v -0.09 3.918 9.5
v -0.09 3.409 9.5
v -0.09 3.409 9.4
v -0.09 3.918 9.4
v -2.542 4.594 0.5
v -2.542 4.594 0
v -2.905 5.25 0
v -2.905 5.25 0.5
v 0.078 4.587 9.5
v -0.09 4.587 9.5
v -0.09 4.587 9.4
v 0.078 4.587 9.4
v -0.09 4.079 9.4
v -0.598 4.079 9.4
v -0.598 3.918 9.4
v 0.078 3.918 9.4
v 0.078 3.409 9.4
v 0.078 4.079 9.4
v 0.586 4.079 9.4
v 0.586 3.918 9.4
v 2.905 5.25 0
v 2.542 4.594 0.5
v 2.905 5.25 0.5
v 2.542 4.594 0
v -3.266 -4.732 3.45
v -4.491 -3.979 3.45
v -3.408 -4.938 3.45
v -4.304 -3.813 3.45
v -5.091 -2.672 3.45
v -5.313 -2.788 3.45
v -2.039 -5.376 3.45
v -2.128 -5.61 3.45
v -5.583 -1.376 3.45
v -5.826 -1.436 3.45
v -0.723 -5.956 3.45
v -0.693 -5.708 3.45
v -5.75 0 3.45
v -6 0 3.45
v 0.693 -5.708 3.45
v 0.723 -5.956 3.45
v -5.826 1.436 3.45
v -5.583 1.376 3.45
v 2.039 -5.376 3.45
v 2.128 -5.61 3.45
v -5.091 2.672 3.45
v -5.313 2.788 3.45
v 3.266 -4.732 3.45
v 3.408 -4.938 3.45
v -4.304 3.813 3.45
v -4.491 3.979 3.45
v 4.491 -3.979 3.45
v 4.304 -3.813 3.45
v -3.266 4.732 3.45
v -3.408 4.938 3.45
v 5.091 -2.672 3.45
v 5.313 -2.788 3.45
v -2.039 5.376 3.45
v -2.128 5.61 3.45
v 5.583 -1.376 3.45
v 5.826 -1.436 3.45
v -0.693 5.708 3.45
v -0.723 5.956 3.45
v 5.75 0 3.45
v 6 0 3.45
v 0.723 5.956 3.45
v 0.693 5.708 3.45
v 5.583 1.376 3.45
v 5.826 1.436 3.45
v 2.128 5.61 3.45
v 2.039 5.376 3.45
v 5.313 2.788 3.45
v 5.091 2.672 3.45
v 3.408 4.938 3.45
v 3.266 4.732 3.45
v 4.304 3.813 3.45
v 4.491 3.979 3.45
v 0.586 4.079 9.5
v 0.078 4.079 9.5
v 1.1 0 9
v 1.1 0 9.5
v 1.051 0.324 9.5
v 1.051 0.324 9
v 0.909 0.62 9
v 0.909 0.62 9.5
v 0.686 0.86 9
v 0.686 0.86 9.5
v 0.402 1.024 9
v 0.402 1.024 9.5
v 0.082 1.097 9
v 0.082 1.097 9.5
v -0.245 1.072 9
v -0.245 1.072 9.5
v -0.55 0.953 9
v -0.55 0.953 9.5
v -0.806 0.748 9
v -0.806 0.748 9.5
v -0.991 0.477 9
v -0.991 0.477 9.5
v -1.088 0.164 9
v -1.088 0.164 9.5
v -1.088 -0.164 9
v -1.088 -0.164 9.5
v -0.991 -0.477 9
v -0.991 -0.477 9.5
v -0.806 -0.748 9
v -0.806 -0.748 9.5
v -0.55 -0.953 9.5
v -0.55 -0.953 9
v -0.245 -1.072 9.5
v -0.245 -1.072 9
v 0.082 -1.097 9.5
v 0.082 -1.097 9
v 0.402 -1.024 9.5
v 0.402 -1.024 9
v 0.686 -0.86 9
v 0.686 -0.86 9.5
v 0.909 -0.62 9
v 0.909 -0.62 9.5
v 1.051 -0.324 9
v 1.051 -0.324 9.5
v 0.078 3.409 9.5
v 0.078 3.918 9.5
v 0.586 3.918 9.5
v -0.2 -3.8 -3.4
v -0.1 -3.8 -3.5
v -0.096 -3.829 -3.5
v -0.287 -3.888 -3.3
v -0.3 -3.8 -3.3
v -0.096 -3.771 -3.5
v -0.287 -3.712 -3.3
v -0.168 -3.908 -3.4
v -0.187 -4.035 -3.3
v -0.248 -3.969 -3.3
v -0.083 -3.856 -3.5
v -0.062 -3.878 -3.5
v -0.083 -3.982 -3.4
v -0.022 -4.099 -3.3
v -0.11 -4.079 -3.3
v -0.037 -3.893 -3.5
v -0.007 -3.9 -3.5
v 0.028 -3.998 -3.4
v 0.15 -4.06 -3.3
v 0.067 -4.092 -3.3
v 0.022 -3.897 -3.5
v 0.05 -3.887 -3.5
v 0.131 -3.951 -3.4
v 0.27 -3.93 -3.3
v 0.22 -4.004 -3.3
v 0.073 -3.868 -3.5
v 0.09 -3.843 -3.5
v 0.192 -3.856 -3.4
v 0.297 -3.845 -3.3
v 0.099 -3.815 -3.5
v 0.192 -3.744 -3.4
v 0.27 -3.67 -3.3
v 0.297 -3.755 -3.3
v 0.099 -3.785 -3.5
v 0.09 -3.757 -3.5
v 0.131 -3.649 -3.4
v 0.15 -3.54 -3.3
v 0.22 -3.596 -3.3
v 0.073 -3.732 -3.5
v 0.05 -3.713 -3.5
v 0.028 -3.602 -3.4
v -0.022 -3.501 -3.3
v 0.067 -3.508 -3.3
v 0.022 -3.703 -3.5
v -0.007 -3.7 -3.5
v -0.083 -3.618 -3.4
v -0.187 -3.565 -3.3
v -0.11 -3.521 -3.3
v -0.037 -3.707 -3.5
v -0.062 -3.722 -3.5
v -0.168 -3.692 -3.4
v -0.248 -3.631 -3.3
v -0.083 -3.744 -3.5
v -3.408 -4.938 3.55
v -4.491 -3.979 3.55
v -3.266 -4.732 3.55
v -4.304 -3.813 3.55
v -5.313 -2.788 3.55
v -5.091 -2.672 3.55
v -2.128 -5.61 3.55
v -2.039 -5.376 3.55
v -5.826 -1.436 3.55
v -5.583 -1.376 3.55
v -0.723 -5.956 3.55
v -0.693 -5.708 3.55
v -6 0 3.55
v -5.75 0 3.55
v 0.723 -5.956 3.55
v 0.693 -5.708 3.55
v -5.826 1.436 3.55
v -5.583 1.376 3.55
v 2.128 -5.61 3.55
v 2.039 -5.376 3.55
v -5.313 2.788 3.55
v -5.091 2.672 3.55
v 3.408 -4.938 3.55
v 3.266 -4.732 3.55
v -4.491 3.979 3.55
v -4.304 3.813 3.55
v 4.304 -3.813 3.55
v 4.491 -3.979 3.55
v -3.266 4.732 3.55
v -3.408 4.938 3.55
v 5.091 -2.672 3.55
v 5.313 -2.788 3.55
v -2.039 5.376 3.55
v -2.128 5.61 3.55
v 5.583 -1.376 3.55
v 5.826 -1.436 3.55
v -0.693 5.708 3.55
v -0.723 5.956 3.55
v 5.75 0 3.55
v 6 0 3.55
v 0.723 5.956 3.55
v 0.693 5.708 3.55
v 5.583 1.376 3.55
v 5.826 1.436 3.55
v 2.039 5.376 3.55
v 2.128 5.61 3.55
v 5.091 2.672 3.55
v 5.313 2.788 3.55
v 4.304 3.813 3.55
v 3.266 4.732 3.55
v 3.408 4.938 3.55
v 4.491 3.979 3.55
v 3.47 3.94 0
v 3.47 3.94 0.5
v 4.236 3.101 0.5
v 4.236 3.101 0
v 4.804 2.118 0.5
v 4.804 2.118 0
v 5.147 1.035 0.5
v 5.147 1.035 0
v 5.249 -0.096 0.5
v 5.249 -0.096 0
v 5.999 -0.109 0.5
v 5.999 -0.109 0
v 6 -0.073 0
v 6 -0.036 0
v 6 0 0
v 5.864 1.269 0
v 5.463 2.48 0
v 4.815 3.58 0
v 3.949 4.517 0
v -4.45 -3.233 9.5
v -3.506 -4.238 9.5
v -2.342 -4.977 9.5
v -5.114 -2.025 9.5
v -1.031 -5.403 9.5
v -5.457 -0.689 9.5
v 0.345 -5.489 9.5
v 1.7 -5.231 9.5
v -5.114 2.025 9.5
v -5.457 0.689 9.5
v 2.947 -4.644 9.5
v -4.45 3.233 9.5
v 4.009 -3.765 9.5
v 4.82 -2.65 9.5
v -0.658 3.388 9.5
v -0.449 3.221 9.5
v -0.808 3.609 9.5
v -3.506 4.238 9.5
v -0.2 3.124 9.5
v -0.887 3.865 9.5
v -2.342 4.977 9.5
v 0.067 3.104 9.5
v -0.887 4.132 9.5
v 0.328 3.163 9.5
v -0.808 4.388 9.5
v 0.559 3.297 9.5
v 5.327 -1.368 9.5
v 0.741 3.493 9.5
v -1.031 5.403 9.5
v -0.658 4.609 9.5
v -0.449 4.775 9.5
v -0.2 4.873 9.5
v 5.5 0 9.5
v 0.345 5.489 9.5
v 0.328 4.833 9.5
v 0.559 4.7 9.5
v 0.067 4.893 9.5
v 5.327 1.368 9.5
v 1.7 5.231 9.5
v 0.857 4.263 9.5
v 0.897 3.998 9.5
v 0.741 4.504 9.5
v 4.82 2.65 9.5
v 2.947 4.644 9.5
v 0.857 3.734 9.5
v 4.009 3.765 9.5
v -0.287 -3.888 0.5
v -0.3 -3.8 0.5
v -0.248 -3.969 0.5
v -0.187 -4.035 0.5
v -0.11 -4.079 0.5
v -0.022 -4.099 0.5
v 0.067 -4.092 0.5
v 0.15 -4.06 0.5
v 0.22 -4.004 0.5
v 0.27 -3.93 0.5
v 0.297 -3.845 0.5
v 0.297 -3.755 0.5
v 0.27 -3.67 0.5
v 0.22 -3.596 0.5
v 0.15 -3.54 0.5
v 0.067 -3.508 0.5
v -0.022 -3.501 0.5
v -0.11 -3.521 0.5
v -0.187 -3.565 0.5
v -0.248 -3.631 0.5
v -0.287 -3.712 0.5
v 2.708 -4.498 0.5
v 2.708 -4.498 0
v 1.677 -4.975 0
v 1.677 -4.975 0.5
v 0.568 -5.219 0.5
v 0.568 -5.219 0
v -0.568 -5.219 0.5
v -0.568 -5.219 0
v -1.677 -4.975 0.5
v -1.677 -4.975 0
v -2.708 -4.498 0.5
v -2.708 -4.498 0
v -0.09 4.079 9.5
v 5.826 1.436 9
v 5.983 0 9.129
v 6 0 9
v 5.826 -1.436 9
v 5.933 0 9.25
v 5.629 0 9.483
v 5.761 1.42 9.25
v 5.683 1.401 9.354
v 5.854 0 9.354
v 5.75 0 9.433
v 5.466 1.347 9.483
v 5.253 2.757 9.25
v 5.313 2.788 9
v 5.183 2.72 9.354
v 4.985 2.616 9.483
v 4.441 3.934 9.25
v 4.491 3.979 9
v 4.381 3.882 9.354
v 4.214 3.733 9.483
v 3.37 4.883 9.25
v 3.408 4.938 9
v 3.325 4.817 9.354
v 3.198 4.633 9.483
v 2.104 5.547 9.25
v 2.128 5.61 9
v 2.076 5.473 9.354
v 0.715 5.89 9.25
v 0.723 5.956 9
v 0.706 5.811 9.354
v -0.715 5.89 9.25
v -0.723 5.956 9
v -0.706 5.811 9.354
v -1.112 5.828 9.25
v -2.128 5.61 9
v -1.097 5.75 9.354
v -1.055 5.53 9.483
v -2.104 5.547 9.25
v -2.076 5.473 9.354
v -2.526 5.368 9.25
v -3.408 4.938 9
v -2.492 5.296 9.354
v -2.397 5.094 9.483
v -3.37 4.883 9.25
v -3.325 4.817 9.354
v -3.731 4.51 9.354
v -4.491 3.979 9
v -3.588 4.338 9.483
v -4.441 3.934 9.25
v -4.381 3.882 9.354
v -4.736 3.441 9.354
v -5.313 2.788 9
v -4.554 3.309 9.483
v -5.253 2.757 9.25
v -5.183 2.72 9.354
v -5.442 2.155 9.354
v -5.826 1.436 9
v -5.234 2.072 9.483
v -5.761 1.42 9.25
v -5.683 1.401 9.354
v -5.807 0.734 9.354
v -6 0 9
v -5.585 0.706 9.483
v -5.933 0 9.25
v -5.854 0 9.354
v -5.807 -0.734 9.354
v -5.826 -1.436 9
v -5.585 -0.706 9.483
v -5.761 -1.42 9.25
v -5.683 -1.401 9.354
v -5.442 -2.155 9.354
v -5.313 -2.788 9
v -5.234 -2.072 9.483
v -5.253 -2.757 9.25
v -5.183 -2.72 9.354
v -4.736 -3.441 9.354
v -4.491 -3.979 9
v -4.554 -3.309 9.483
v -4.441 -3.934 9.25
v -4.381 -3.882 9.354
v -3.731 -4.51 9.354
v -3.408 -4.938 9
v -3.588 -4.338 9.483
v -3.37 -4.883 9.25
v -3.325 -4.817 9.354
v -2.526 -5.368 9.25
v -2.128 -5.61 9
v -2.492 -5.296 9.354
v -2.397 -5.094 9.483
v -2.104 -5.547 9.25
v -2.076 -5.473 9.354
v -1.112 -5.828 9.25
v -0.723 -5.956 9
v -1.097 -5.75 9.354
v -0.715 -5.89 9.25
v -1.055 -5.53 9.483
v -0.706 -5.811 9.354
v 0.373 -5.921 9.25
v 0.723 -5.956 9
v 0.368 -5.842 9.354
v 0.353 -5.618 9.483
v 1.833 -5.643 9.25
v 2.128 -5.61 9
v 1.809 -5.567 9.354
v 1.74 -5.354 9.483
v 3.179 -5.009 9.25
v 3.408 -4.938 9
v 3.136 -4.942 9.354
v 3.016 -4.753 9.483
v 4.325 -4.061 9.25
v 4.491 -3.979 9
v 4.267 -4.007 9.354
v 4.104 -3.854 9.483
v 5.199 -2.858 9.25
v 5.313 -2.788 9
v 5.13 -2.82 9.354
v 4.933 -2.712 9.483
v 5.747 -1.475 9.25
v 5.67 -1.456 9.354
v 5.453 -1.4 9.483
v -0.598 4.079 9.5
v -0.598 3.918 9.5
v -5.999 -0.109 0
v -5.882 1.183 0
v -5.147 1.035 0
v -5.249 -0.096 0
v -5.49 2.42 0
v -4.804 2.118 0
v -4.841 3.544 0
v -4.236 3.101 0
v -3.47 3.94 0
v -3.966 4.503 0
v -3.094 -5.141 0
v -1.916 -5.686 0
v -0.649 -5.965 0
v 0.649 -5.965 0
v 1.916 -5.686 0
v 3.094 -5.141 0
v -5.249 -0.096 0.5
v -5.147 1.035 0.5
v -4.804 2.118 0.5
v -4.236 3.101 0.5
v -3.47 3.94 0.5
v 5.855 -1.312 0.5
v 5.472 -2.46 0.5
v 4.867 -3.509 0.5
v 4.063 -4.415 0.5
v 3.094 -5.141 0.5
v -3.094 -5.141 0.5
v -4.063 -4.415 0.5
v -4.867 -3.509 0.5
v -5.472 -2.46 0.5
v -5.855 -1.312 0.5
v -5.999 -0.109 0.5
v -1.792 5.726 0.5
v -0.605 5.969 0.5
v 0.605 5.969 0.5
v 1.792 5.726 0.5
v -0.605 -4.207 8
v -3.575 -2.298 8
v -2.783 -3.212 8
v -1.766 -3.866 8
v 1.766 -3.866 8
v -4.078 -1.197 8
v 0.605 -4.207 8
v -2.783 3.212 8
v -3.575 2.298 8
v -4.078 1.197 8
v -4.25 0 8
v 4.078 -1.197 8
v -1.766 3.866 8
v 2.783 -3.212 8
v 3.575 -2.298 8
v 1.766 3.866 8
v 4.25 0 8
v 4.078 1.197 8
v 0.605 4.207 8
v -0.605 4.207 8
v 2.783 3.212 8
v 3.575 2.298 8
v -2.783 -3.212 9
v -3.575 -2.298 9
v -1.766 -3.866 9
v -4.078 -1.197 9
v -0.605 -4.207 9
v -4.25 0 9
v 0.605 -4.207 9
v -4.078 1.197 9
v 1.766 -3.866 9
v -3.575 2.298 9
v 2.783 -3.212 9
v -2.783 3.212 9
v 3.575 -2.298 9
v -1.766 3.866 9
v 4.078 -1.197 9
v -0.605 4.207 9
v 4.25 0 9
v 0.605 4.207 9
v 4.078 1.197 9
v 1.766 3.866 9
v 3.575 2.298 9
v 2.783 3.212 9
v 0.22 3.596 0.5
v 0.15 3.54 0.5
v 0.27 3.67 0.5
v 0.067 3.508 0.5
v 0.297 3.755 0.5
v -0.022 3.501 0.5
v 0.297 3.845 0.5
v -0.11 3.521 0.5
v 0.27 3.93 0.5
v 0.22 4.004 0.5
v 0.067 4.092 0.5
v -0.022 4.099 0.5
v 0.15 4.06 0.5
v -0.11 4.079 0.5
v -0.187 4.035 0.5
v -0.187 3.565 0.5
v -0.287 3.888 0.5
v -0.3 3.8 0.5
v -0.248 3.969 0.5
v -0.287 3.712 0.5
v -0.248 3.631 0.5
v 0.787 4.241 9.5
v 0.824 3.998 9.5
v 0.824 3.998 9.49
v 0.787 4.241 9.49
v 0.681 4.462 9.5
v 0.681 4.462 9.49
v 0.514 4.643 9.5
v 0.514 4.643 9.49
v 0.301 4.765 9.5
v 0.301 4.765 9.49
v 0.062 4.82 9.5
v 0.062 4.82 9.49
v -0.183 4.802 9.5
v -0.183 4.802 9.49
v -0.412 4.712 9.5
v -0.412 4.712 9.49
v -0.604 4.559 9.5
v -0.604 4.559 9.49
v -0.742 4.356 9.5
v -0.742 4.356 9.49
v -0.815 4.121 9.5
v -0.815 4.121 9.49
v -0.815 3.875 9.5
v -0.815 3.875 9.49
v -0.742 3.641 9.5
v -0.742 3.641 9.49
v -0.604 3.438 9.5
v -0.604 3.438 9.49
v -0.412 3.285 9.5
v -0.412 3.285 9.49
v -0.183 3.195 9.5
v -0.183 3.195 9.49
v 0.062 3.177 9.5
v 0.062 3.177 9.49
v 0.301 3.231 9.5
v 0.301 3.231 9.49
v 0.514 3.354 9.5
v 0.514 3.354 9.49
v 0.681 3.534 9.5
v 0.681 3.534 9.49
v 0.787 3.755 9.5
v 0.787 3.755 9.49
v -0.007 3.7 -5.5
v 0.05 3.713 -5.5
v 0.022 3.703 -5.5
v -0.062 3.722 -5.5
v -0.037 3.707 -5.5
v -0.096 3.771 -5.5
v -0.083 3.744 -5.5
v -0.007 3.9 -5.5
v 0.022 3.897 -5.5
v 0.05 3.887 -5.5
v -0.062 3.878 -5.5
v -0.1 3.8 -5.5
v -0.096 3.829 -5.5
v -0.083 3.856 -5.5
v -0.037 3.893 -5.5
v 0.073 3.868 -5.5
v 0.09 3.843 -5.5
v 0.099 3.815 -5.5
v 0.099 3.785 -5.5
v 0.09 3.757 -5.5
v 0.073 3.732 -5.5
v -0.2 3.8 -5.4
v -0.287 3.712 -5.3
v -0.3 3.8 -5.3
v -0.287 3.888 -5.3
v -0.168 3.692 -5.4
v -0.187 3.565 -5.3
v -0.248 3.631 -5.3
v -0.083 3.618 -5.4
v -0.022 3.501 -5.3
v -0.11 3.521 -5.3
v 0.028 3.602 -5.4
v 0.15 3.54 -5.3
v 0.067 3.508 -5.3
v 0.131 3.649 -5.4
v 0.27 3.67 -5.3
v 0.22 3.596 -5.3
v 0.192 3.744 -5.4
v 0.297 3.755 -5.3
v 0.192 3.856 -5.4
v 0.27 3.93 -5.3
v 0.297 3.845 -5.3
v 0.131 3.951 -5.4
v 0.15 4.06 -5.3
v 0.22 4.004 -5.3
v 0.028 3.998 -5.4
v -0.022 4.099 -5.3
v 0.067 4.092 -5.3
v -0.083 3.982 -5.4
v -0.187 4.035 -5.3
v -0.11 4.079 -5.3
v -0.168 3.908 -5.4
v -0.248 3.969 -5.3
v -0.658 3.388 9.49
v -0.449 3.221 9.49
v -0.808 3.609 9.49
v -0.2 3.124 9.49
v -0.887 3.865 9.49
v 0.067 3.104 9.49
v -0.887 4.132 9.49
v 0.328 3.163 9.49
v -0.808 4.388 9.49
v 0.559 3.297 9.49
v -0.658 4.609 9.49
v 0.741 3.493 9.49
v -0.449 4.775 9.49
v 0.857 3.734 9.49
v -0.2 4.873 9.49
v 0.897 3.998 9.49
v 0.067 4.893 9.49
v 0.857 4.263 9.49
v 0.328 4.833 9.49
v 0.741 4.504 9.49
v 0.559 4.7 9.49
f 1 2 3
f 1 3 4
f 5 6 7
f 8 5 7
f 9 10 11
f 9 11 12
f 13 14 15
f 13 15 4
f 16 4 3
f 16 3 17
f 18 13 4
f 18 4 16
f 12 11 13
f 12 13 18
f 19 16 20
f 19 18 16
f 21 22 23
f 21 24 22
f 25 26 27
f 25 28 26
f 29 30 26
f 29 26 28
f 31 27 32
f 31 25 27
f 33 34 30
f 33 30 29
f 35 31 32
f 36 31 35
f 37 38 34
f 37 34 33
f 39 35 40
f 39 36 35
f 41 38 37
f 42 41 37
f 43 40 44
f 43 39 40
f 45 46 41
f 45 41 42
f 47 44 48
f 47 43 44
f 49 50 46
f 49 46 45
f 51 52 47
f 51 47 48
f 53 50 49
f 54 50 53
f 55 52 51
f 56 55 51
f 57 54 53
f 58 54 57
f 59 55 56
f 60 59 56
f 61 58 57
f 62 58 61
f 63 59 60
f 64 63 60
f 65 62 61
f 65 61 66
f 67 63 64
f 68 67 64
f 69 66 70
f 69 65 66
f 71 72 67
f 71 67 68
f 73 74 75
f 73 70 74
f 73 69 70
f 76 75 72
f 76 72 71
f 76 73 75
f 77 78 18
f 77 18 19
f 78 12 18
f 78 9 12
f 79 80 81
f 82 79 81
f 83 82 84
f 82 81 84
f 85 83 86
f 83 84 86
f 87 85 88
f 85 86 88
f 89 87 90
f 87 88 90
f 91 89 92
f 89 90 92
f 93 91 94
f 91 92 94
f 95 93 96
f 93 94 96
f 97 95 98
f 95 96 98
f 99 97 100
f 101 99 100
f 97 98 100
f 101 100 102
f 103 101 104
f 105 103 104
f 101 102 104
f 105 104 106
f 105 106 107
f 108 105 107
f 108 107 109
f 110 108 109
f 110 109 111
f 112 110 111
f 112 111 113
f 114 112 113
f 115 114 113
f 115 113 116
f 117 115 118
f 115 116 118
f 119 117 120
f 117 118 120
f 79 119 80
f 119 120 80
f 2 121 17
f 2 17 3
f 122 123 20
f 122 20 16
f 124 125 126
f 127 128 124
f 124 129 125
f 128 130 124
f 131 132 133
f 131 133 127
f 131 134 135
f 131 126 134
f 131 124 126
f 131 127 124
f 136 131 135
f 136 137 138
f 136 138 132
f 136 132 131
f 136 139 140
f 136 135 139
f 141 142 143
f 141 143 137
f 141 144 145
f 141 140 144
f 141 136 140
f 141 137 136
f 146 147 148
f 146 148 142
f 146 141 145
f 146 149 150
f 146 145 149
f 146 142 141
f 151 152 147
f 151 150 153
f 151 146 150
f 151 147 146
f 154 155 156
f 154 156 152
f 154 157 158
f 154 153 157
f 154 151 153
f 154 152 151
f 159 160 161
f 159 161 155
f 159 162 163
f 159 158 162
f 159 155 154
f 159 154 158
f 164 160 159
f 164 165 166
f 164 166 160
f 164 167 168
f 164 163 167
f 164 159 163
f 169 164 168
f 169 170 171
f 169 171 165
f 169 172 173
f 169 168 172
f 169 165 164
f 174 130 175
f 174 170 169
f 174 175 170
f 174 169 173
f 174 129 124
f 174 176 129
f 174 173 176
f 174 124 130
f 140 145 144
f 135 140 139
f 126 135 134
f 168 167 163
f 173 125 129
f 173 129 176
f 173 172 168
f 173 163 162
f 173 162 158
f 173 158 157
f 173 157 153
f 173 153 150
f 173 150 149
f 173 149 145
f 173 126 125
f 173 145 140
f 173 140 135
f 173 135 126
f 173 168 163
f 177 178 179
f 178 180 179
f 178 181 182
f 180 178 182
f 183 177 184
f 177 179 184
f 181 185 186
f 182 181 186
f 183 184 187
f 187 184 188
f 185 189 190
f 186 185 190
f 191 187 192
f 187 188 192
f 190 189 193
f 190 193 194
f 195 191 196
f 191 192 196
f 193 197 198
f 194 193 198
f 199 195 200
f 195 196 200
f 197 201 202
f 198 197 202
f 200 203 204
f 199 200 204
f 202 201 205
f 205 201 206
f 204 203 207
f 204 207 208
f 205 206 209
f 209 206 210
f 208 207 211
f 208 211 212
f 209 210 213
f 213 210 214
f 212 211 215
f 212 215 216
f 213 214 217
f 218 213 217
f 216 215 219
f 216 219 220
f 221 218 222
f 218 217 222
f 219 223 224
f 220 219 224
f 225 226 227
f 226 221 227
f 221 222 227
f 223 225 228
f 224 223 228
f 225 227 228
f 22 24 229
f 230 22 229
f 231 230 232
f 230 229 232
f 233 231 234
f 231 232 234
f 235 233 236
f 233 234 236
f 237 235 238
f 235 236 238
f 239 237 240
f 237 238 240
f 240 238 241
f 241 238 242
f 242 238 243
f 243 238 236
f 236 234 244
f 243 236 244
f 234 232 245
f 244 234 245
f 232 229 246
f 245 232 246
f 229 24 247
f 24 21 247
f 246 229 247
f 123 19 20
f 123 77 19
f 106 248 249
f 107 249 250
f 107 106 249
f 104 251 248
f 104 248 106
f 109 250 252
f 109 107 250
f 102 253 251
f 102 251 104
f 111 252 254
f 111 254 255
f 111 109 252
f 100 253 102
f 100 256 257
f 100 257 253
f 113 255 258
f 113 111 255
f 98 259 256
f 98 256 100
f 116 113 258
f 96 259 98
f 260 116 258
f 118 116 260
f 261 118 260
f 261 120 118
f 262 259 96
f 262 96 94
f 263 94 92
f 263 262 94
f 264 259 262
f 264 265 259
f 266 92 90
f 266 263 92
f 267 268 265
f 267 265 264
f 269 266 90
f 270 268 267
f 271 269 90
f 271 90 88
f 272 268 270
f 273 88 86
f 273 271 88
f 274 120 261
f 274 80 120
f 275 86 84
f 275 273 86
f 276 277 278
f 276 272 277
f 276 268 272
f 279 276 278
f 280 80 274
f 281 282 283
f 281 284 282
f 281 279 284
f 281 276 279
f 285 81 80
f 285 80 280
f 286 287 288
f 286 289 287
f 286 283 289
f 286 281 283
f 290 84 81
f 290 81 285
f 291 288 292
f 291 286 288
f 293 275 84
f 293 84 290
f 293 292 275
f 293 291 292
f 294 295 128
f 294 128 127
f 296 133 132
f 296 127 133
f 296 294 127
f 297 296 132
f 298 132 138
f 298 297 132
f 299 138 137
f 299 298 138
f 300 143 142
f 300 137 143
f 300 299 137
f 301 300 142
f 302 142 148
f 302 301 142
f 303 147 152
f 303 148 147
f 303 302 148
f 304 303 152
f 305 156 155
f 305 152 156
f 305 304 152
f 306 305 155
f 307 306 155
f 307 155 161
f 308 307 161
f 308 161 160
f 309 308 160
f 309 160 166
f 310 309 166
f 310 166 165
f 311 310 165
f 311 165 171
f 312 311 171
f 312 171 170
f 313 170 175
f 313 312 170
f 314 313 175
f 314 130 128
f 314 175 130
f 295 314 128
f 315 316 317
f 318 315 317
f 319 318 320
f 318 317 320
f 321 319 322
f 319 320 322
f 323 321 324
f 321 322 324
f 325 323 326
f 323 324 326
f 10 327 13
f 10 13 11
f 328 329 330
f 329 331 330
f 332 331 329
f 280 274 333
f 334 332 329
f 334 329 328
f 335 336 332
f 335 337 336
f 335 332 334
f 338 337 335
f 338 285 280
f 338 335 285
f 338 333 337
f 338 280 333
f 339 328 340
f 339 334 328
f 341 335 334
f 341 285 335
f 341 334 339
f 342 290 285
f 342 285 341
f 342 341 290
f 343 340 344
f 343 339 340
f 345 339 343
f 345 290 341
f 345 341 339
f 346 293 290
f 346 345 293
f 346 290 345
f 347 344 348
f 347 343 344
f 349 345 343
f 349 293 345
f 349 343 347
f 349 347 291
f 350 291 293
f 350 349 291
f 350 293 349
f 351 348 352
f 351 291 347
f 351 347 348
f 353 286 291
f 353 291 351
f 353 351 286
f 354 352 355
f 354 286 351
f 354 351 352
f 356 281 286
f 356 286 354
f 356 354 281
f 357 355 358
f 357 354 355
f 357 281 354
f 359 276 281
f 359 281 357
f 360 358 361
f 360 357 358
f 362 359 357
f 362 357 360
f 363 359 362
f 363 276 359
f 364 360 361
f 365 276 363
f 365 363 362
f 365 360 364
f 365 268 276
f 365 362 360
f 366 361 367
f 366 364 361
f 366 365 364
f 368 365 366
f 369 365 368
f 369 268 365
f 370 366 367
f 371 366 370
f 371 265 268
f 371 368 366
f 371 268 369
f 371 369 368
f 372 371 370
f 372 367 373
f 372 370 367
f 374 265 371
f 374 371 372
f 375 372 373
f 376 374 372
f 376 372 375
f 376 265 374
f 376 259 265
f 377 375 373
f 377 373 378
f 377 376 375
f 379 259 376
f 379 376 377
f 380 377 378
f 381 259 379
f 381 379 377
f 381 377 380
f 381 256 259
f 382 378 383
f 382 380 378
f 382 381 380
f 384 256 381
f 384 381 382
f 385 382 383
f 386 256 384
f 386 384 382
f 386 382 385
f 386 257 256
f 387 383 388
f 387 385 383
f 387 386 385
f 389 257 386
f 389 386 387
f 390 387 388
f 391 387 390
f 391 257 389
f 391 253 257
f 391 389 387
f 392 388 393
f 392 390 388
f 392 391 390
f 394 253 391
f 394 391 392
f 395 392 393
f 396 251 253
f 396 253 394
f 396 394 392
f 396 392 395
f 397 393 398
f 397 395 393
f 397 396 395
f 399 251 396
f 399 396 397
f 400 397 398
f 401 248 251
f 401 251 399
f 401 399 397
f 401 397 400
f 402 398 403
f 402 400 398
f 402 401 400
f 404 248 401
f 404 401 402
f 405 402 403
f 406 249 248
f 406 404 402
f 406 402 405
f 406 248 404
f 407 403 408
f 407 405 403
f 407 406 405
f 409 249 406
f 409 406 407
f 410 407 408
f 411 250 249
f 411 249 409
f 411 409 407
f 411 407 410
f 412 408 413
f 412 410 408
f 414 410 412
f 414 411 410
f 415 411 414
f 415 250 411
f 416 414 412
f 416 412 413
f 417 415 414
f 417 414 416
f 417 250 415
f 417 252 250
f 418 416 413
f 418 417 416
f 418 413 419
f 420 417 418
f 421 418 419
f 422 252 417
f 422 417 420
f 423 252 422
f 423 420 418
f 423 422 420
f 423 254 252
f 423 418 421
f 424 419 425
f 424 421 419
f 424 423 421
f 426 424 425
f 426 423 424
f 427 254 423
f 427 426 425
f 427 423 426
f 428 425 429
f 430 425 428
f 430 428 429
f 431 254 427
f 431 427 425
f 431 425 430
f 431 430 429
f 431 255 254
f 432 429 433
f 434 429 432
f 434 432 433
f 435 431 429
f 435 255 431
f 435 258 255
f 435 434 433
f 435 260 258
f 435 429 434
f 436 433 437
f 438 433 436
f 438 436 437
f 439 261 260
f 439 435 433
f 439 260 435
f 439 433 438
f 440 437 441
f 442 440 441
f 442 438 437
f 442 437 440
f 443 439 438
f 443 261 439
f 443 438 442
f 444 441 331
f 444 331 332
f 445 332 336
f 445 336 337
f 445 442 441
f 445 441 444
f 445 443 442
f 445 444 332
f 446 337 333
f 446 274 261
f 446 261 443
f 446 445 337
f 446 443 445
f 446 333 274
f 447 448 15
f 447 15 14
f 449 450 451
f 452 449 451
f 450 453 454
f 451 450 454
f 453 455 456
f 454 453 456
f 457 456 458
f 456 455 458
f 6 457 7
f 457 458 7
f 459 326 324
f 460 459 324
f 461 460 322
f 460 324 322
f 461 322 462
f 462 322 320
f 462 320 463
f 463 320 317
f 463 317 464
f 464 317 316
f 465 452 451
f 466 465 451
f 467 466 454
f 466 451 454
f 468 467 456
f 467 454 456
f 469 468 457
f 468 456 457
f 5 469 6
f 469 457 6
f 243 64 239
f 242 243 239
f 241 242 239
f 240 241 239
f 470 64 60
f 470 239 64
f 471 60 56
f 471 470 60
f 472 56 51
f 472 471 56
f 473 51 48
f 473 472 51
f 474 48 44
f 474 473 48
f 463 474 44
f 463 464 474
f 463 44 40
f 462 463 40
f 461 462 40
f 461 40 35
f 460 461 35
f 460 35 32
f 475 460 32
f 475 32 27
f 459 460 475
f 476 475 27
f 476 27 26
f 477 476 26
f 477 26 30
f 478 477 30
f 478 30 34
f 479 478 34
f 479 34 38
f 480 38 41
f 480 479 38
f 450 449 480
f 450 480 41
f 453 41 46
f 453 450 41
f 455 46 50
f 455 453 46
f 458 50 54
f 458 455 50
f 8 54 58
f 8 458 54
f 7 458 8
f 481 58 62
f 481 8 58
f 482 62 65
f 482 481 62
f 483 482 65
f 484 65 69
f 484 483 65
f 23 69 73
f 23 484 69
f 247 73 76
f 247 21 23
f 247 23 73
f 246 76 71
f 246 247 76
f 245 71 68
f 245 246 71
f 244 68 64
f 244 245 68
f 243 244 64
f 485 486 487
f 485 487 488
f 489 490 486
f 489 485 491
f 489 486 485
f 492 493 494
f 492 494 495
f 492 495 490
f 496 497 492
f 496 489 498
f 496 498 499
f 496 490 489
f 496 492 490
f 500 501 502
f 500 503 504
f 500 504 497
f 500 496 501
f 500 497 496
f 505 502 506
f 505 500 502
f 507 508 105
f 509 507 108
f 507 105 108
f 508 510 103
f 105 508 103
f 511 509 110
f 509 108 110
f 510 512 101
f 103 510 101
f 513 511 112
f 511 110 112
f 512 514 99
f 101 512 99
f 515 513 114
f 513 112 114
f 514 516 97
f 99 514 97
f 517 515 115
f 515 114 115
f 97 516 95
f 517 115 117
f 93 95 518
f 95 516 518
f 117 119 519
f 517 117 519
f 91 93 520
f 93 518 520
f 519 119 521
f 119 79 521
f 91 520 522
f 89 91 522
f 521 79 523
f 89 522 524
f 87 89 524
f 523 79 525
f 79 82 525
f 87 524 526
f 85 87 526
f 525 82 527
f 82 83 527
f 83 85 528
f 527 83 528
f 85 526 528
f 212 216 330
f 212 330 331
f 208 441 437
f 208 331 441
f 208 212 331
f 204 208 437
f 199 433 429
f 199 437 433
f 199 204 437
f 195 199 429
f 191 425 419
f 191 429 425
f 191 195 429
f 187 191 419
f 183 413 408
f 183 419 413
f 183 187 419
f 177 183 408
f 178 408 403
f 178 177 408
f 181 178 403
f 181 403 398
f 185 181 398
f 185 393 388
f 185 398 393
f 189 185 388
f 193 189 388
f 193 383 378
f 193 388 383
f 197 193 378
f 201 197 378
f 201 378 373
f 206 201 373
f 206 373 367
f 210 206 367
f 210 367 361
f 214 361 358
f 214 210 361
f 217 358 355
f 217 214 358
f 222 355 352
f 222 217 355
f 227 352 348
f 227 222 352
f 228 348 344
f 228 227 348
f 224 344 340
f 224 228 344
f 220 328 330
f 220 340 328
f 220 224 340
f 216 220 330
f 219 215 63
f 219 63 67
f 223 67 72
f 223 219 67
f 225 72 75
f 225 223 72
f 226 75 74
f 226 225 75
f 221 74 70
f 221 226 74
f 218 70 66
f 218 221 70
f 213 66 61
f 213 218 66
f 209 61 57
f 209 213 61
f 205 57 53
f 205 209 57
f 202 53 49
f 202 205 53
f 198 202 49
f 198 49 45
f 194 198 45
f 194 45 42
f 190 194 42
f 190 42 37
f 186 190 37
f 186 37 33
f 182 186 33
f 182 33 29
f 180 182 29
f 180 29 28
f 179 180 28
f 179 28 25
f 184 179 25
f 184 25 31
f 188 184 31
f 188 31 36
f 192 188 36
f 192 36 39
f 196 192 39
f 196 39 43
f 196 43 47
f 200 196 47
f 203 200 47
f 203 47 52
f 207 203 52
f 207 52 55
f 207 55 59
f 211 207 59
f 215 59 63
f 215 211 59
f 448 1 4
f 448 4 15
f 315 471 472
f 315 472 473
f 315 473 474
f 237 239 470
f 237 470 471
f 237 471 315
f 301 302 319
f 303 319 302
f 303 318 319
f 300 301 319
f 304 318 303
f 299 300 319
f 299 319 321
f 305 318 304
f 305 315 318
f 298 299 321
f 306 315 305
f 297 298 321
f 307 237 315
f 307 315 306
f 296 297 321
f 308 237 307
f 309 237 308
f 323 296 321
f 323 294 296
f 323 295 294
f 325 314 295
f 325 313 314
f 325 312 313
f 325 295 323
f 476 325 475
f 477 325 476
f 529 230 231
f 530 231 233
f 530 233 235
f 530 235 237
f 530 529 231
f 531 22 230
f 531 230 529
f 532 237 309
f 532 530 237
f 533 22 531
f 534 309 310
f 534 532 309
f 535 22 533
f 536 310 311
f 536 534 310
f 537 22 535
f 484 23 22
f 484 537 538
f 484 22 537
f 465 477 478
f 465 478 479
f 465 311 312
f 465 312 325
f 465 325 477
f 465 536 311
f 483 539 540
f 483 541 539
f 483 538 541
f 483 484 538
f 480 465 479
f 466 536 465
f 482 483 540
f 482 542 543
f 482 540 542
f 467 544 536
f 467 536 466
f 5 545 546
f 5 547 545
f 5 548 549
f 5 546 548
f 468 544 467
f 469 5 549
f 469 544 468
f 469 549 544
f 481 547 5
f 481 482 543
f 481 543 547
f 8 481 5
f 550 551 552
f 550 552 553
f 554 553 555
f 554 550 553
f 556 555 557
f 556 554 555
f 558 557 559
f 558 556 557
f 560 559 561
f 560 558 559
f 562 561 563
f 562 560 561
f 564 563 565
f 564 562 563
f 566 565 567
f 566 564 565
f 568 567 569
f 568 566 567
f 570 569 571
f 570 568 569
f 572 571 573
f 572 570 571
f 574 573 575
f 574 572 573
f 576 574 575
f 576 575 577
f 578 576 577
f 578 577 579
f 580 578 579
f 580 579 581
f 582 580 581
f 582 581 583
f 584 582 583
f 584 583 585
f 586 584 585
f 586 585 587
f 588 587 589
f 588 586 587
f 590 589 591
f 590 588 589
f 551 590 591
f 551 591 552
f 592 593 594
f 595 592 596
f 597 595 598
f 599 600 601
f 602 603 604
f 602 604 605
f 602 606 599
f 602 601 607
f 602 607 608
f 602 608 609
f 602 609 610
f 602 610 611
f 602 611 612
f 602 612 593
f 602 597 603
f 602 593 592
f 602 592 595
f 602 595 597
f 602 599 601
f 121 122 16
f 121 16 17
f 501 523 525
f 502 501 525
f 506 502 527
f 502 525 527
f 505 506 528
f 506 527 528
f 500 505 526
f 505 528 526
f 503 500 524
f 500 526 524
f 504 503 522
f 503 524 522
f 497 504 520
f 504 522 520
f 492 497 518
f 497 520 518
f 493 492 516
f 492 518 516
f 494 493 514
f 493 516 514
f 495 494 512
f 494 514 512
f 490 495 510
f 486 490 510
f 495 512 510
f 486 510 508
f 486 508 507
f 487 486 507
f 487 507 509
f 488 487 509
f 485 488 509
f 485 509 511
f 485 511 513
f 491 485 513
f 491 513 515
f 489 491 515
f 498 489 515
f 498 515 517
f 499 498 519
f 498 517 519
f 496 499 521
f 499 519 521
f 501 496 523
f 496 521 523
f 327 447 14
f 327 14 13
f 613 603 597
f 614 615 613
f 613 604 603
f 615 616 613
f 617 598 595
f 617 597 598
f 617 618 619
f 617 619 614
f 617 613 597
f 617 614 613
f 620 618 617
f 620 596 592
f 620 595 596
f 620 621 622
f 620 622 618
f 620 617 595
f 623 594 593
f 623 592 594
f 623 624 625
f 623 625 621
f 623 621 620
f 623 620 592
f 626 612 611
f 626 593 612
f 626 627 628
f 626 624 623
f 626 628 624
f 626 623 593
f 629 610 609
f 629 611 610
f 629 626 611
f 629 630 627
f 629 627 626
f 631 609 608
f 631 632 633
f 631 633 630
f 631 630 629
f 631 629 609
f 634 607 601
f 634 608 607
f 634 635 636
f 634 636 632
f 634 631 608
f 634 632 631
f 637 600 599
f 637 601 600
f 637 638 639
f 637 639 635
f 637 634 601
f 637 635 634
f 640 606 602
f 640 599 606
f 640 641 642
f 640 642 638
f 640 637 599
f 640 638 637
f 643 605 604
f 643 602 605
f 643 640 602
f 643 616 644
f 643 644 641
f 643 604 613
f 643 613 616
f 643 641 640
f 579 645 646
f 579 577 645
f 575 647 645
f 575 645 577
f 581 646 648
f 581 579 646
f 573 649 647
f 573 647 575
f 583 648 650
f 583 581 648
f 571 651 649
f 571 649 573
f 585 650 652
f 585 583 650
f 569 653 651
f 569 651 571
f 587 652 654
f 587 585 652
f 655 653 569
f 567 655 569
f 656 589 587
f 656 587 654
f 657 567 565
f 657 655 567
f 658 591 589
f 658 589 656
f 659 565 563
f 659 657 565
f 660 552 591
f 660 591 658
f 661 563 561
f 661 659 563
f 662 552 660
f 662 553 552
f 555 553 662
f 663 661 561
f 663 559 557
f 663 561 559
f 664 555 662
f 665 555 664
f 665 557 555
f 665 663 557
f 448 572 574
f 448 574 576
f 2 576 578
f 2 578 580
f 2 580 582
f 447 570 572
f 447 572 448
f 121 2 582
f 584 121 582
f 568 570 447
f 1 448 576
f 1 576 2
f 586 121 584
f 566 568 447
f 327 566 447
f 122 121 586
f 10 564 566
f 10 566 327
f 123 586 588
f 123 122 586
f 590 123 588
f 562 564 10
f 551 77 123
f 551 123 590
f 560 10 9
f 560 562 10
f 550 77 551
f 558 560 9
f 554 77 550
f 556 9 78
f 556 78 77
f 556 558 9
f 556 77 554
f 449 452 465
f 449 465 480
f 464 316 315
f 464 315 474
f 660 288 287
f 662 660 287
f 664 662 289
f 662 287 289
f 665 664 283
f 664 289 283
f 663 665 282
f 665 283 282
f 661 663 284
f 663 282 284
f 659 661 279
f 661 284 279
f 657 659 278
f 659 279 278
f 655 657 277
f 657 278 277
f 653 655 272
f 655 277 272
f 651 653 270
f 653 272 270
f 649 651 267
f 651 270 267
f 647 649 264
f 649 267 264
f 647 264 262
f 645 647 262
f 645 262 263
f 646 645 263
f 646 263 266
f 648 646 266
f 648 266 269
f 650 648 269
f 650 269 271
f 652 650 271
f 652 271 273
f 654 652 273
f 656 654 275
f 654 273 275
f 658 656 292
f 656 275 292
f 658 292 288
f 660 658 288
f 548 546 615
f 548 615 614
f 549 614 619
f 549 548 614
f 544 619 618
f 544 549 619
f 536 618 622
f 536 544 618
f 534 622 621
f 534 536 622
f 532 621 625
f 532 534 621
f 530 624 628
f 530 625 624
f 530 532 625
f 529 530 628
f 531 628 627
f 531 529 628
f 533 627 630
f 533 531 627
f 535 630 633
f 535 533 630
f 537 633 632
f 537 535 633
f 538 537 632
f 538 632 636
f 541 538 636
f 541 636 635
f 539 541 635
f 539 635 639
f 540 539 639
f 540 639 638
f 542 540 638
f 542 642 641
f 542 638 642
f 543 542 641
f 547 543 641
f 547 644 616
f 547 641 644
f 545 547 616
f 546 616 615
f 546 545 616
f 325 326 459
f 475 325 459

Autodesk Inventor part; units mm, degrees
ref_plane "YZ Plane" through (0, 0, 0) normal (1, 0, 0) x (0, 1, 0)
ref_plane "XZ Plane" through (0, 0, 0) normal (0, 1, 0) x (-1, 0, 0)
ref_plane "XY Plane" through (0, 0, 0) normal (0, 0, 1) x (1, 0, 0)
sketch "Sketch1" plane through (0, 0, 0) normal (0, 0, 1) x (1, 0, 0)
  circle A0 centre (0, 0) radius 6
  dimension "d0" = 12
extrude "Extrusion1" add sketch "Sketch1" along normal blind 9.5
ref_plane "Work Plane1" through (0, 0, 9) normal (0, 0, 1) x (1, 0, 0)
sketch "Sketch2" plane through (0, 0, 9) normal (0, 0, 1) x (1, 0, 0)
  circle A0 centre (0, 0) radius 6 projected
  circle A1 centre (0, 0) radius 4.25
  dimension "d4" = 8.5
extrude "Extrusion2" cut sketch "Sketch2" against normal blind 1 contours A1
sketch "Sketch3" plane through (0, 0, 9.5) normal (0, 0, 1) x (1, 0, 0)
  circle A0 centre (0, 0) radius 6 projected
  circle A1 centre (0, 0) radius 1.1
  dimension "d7" = 2.2
extrude "Extrusion3" cut sketch "Sketch3" against normal blind 0.5 contours A1
sketch "Sketch4" plane through (0, 0, 0) normal (0, 0, -1) x (-1, 0, 0)
  circle A0 centre (0, 0) radius 6 projected
  circle A1 centre (0, 0) radius 5.25
  dimension "d10" = 10.5
extrude "Extrusion4" cut sketch "Sketch4" against normal blind 0.5 contours A1
fillet "Fillet1" radius 0.5 1 edges at (-6, 0, 9.5)
sketch "Sketch5" plane through (0, 0, 0) normal (0, 0, -1) x (-1, 0, 0)
  circle A0 centre (0, 0) radius 5.25 projected
  circle A1 centre (0, 0) radius 6 projected
  line L0 (2.5416, 4.5938) -> (2.9047, 5.25)
  line L1 (-2.5416, 4.5938) -> (-2.9047, 5.25)
extrude "Extrusion5" cut sketch "Sketch5" against normal blind 0.5 contours A0 L1 A1 L0 picked at (0.1766, 5.7207)
pattern_circular "Circular Pattern1" count 3 over 360 about axis through (0, 0, 0) along (0, 0, 1) of "Extrusion5"
sketch "Sketch6" plane through (0, 0, 0.5) normal (0, 0, -1) x (-1, 0, 0)
  arc A0 (-5.999, -0.1094) -> (-3.0943, -5.1406) centre (0, 0) ccw projected
  circle A1 centre (0, 3.8) radius 0.3
  dimension "d19" = 0.6
  dimension "d20" = 3.8
extrude "Extrusion6" add sketch "Sketch6" along normal blind 6
sketch "Sketch7" plane through (0, 0, 0.5) normal (0, 0, -1) x (-1, 0, 0)
  arc A0 (-2.5416, 4.5938) -> (-5.2491, -0.0957) centre (0, 0) ccw projected
  circle A1 centre (0, -3.8) radius 0.3
  dimension "d23" = 0.6
  dimension "d24" = 3.8
extrude "Extrusion7" add sketch "Sketch7" along normal blind 4
chamfer "Chamfer1" distance 0.2 angle 45 2 edges at (0.3, 3.8, -5.5) (0.3, -3.8, -3.5)
sketch "Sketch8" plane through (0, 0, 9.5) normal (0, 0, 1) x (1, 0, 0)
  line L0 (-0.7574, 4.5872) -> (0.6588, 4.5872) construction
  line L1 (0.6588, 4.5872) -> (0.6588, 3.3036) construction
  line L2 (0.6588, 3.3036) -> (-0.7574, 3.3036) construction
  line L3 (-0.7574, 3.3036) -> (-0.7574, 4.5872) construction
  line L4 (0.5858, 3.9175) -> (0.0777, 3.9175)
  line L5 (0.0777, 3.9175) -> (0.0777, 3.4094)
  line L6 (0.0777, 3.4094) -> (-0.09, 3.4094)
  line L7 (-0.09, 3.4094) -> (-0.09, 3.9175)
  line L8 (-0.09, 3.9175) -> (-0.5981, 3.9175)
  line L9 (-0.5981, 3.9175) -> (-0.5981, 4.0791)
  line L10 (-0.5981, 4.0791) -> (-0.09, 4.0791)
  line L11 (-0.09, 4.0791) -> (-0.09, 4.5872)
  line L12 (-0.09, 4.5872) -> (0.0777, 4.5872)
  line L13 (0.0777, 4.5872) -> (0.0777, 4.0791)
  line L14 (0.0777, 4.0791) -> (0.5858, 4.0791)
  line L15 (0.5858, 4.0791) -> (0.5858, 3.9175)
extrude "Extrusion8" cut sketch "Sketch8" against normal blind 0.1
sketch "Sketch9" plane through (0, 0, 9.5) normal (0, 0, 1) x (1, 0, 0)
  circle A0 centre (0, 3.9983) radius 0.824
  circle A1 centre (0, 3.9983) radius 0.8972
extrude "Extrusion9" cut sketch "Sketch9" against normal blind 0.01
ref_plane "Work Plane2" through (0, 0, 3.5) normal (0, 0, 1) x (1, 0, 0)
sketch "Sketch10" plane through (0, 0, 3.5) normal (0, 0, 1) x (1, 0, 0)
  circle A0 centre (0, 0) radius 6 projected
  circle A1 centre (0, 0) radius 5.75
  dimension "d35" = 11.5
extrude "Extrusion10" cut sketch "Sketch10" along normal mid plane 0.1
properties part number "buzzer"
